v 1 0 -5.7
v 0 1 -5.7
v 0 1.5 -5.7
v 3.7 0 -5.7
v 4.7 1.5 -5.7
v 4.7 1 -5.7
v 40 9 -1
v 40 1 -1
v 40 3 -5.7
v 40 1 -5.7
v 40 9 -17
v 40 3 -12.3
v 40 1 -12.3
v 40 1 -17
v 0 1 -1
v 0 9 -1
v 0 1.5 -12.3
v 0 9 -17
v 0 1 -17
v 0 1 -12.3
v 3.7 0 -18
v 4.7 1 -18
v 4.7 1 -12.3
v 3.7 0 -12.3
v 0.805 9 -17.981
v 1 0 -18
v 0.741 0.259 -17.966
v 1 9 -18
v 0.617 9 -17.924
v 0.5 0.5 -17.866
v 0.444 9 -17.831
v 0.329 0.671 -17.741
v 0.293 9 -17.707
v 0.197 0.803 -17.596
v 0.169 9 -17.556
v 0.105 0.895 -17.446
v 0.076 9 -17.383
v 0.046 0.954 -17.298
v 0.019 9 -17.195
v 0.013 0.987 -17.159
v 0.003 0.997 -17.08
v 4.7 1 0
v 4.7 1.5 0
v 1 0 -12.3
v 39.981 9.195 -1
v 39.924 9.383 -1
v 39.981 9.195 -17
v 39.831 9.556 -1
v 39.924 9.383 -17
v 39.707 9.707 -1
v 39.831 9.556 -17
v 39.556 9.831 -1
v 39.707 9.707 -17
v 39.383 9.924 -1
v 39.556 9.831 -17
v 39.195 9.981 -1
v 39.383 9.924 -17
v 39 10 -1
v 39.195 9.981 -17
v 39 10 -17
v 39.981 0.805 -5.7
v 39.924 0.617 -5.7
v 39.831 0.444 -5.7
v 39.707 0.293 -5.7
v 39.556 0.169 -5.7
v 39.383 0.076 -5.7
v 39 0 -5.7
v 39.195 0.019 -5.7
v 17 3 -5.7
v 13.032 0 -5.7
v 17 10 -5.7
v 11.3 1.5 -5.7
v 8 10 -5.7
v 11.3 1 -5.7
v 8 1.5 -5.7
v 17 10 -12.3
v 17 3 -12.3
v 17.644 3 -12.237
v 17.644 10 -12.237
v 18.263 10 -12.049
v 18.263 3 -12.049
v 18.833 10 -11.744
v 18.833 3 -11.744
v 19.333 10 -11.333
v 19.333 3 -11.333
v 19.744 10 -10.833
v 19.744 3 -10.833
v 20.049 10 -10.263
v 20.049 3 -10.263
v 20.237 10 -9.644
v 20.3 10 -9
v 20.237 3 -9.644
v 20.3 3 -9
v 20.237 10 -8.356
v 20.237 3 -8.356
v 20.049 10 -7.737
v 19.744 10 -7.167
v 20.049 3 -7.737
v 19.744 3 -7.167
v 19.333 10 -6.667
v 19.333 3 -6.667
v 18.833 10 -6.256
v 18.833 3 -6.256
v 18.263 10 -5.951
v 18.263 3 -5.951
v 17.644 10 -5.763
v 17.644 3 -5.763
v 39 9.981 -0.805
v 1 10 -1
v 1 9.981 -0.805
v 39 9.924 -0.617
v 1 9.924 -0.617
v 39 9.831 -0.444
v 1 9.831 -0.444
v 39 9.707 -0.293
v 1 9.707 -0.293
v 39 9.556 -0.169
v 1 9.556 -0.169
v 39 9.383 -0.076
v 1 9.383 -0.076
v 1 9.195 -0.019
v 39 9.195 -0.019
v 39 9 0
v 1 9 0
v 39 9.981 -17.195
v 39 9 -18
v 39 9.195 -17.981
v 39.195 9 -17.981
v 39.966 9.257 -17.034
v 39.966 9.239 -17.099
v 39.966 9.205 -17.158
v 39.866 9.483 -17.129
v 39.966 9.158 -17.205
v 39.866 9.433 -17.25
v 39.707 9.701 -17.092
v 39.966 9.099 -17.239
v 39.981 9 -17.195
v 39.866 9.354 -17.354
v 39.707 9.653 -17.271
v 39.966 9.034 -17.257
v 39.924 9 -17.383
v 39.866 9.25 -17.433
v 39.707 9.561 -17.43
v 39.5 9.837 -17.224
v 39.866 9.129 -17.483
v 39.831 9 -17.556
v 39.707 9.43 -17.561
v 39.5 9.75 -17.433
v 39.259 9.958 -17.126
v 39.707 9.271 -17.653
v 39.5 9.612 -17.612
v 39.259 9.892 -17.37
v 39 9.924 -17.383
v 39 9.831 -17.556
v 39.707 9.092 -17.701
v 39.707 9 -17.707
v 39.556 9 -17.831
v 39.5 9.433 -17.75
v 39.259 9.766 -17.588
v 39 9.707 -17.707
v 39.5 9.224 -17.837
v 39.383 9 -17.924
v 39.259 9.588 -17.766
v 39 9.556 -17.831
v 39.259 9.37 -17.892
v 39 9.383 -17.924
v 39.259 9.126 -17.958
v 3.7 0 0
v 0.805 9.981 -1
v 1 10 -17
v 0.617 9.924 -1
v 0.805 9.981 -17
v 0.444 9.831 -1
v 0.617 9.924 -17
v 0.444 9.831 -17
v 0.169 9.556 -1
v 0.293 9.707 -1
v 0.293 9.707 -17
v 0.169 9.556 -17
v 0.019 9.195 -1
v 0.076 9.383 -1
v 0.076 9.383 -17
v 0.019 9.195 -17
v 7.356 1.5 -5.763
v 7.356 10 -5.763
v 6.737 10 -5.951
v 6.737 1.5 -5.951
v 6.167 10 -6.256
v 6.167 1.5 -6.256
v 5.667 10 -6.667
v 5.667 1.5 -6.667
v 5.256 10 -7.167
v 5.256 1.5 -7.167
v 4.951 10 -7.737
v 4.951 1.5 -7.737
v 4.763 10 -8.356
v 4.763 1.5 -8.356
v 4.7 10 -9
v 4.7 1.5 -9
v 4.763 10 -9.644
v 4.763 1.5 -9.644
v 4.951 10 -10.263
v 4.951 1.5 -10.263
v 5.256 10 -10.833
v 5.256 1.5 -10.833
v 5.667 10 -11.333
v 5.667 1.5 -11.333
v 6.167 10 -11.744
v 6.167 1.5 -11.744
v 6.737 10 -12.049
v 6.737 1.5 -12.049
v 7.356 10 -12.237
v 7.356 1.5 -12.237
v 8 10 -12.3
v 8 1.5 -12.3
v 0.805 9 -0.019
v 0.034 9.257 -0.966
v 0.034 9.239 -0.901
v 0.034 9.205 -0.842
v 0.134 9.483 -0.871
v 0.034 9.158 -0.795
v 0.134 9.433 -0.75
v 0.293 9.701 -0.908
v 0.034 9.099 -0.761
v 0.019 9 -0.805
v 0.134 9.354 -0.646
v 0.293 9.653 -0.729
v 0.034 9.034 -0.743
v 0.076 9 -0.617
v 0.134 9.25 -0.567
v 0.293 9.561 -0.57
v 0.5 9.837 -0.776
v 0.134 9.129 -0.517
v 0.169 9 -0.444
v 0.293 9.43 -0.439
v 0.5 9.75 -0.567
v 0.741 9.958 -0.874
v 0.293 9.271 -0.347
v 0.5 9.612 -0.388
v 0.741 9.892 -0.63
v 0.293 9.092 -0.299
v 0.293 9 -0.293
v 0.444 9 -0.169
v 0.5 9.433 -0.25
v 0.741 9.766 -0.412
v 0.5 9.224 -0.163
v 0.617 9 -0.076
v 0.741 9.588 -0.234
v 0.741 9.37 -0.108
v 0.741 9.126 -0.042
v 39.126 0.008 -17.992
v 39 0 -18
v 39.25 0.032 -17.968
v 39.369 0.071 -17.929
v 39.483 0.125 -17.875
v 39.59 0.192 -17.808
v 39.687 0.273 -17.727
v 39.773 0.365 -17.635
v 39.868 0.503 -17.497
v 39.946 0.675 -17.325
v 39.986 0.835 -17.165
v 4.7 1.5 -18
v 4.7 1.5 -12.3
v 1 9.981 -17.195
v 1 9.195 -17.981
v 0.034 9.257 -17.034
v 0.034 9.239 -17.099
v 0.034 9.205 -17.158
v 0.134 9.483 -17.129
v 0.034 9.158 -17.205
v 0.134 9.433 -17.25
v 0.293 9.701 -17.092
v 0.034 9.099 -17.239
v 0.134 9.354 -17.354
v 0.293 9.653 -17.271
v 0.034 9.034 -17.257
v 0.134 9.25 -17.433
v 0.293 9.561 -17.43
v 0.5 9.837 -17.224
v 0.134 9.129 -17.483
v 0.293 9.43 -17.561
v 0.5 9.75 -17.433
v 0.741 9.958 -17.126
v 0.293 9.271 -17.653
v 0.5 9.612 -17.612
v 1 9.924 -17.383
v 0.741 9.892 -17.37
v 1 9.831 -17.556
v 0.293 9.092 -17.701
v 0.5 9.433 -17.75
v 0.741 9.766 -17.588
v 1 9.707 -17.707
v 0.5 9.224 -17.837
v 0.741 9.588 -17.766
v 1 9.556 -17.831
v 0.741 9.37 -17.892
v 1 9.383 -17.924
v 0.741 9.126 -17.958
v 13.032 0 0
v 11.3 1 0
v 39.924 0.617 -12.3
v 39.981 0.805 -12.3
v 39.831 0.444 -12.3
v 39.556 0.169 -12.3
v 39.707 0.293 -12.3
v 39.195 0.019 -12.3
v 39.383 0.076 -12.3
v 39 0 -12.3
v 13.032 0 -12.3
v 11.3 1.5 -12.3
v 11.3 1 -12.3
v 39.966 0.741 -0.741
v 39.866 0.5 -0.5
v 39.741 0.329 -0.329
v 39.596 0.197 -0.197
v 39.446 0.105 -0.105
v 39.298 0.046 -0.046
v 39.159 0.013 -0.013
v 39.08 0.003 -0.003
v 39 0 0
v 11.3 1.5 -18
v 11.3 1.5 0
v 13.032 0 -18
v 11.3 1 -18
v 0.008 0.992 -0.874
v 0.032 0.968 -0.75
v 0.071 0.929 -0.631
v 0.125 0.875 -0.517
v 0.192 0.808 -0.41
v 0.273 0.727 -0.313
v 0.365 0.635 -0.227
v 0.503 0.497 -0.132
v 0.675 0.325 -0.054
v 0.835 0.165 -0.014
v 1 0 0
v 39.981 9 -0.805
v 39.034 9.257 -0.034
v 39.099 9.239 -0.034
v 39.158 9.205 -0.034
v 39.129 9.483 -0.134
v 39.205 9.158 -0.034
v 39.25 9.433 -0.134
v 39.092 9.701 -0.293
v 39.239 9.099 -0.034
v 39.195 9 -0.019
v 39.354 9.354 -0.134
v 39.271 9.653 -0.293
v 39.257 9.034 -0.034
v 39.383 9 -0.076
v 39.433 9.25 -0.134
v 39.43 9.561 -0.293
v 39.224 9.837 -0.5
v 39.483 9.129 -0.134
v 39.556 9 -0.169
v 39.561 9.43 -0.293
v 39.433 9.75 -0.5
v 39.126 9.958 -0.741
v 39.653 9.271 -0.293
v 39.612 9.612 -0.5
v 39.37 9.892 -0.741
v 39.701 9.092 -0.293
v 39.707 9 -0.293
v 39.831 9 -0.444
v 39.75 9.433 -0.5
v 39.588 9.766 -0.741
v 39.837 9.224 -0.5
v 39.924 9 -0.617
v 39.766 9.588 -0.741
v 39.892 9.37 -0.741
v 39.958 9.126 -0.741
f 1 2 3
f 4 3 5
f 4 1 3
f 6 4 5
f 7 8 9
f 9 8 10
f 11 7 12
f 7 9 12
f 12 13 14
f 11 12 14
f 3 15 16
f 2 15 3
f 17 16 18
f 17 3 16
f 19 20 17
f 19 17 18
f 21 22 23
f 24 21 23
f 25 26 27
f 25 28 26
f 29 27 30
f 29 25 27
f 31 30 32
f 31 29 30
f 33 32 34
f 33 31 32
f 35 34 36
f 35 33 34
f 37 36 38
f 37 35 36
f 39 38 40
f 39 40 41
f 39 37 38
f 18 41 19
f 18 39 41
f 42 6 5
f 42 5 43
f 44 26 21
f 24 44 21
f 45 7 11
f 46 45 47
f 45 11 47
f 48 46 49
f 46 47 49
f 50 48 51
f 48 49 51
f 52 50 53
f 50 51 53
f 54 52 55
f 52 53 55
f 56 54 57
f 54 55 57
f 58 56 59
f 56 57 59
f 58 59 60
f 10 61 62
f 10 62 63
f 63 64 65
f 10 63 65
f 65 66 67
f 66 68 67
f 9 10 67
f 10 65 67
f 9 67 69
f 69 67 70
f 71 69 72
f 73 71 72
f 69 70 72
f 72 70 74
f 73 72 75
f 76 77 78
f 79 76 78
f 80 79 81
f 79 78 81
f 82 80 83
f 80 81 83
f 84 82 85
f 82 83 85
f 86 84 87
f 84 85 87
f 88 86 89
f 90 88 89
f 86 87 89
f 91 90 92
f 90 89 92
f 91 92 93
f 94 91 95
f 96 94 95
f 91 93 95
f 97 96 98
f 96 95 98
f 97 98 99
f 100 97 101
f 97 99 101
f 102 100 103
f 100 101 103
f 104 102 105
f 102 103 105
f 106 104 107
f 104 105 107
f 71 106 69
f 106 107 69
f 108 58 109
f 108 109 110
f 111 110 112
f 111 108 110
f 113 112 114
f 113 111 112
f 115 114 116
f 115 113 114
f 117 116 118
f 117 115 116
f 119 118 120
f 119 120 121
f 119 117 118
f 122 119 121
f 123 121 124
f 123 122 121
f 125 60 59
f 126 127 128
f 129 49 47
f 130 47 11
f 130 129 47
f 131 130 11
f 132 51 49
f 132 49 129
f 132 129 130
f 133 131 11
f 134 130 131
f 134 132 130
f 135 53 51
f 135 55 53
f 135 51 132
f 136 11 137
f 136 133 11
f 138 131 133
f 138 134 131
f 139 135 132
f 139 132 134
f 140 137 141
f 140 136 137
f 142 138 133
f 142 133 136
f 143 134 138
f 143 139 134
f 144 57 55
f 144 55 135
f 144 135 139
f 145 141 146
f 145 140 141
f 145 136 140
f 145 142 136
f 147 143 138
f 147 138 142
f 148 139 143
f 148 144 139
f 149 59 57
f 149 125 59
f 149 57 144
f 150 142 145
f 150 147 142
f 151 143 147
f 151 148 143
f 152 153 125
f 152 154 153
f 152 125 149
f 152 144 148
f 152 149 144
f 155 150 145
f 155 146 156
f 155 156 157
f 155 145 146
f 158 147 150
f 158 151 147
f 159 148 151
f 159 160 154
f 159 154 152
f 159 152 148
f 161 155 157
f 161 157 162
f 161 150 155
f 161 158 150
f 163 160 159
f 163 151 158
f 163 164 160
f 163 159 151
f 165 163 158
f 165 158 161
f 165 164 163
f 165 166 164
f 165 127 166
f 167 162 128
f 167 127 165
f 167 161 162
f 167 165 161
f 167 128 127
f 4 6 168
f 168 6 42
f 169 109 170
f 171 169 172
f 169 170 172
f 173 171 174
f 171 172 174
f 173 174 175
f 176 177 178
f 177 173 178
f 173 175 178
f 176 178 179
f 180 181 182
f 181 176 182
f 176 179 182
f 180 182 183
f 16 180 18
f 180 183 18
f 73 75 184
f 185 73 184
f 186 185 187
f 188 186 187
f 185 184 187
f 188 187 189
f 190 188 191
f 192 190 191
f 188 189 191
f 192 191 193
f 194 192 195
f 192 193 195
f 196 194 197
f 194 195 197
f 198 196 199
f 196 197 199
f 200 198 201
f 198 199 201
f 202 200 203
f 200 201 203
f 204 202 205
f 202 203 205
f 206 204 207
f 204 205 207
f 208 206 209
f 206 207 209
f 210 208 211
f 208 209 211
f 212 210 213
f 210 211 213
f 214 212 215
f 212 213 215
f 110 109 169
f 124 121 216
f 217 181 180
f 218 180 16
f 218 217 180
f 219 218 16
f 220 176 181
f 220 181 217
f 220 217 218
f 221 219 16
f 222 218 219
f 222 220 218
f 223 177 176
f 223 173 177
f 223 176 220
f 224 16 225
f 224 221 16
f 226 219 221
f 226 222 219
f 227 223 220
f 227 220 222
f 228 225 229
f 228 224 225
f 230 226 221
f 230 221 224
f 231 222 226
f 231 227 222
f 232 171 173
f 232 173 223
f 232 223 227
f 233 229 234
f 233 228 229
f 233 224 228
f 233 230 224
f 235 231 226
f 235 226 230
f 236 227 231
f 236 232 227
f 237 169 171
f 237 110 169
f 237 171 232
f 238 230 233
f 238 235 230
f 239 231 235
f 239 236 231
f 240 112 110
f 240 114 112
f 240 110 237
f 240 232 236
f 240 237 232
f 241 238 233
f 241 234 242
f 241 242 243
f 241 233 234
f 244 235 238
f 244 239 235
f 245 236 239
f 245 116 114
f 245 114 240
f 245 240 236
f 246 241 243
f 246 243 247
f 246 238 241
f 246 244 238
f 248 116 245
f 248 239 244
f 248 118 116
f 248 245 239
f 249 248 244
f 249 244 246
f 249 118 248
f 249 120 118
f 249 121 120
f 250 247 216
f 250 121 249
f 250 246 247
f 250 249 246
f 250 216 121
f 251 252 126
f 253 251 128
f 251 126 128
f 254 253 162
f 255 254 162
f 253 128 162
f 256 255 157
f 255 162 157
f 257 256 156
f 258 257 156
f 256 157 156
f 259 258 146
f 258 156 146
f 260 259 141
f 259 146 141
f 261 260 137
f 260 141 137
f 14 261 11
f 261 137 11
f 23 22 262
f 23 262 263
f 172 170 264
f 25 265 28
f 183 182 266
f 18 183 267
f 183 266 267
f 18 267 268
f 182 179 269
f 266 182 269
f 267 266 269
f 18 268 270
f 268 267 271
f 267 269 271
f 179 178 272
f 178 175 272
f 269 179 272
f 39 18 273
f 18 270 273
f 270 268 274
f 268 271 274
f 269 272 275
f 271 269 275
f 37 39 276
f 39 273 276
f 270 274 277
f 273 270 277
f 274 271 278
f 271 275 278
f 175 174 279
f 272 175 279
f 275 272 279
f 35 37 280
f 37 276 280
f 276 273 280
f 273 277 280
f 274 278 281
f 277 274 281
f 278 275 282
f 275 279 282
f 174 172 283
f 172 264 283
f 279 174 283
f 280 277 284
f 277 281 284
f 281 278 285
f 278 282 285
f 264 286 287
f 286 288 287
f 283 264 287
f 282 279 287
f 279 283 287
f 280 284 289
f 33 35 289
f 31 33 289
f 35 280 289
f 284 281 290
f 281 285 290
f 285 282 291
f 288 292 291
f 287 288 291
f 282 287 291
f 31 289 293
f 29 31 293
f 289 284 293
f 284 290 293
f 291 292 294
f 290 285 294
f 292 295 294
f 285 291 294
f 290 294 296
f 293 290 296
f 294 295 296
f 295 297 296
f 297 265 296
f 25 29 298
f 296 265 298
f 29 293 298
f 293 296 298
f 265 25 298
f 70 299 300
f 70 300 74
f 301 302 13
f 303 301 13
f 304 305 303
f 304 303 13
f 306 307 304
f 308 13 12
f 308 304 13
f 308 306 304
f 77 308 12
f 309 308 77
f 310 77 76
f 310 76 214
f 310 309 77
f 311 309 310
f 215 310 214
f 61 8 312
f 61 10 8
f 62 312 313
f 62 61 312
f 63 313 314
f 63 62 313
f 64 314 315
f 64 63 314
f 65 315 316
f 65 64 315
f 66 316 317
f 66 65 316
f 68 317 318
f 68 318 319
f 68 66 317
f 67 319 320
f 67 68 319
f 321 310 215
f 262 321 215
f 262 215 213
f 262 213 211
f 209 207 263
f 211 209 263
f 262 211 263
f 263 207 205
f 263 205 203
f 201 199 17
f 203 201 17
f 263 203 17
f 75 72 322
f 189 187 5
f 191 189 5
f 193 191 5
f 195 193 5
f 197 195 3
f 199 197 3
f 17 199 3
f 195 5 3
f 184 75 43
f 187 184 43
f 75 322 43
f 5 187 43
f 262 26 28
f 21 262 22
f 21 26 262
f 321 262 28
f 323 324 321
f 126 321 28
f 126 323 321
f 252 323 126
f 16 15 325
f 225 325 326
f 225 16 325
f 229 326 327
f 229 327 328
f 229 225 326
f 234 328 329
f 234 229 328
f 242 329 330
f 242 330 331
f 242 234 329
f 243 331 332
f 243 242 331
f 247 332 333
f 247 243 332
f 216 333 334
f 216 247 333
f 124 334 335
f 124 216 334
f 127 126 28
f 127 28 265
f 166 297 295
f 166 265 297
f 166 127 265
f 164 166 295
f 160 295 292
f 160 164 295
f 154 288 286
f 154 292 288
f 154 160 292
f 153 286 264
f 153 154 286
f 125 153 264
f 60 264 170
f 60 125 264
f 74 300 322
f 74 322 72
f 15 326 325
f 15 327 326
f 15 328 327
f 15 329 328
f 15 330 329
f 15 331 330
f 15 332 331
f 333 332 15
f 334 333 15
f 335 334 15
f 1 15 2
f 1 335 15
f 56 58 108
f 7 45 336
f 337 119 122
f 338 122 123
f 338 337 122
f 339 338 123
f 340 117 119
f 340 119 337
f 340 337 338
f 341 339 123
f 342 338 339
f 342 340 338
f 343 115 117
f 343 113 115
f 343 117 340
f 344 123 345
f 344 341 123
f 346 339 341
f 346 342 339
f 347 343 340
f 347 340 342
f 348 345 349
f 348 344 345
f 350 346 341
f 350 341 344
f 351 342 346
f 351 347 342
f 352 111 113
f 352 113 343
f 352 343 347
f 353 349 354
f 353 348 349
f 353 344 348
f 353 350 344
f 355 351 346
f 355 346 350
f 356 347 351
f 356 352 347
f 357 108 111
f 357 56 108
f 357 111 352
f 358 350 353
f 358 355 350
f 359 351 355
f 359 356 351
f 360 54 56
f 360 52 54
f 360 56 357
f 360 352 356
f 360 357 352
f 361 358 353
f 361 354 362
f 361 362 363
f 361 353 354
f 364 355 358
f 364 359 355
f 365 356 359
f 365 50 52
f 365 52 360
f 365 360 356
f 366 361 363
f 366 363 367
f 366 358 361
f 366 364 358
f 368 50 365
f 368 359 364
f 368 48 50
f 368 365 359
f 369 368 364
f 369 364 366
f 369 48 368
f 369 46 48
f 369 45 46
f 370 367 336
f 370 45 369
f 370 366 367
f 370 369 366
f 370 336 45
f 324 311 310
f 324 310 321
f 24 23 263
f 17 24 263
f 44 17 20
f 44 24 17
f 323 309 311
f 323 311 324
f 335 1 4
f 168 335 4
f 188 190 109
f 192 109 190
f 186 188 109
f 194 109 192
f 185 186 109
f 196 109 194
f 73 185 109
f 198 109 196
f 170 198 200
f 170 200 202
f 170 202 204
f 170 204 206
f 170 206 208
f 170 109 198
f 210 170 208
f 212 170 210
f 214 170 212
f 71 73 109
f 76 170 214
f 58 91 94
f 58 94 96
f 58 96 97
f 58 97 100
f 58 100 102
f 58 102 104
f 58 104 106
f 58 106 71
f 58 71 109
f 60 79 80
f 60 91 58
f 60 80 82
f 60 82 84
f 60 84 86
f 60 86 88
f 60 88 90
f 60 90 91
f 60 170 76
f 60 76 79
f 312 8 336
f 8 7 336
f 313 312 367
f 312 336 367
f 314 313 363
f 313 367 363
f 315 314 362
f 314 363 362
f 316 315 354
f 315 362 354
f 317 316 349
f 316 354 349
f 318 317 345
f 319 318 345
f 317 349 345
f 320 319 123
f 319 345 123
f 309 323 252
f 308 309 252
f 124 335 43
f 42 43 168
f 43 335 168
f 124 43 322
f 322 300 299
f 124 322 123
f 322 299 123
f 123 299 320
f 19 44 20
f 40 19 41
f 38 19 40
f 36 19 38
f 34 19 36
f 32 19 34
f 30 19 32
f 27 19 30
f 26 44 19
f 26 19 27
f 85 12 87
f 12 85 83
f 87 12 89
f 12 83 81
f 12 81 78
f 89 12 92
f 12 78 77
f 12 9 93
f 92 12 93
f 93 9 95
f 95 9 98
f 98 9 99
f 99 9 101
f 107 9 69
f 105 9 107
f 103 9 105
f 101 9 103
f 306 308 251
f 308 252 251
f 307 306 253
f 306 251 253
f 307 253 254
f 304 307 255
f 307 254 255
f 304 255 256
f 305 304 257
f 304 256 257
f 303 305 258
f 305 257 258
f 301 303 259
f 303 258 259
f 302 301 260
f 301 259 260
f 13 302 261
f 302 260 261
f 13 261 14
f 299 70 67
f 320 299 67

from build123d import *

# Parameters (mm, degrees)
SKETCH_1_W             = 40
SKETCH_1_H             = 18
EXTRUDE_1_DEPTH        = 10
CUT_EXTRUDE_1_DEPTH    = 3
CUT_EXTRUDE_2_DEPTH    = 1.5
CHAMFER_1_SIZE         = 1
CHAMFER_2_SIZE         = 1
CHAMFER_2_SIZE2        = 1.732050808
CHAMFER_2_PART_2_SIZE  = 1
CHAMFER_2_PART_2_SIZE2 = 1.732050808
FILLET_1_R             = 1


with BuildPart() as part:
    # 草图1 → 凸台-拉伸1 (new body)
    with BuildSketch(Plane(origin=(0, 0, 0), x_dir=(1, 0, 0), z_dir=(0, 1, 0))):
        with Locations((20, 9)):
            Rectangle(SKETCH_1_W, SKETCH_1_H)
        with BuildLine():
            Line((17, 5.7), (8, 5.7))
            ThreePointArc((8, 5.7), (4.7, 9), (8, 12.3))
            Line((8, 12.3), (17, 12.3))
            ThreePointArc((17, 12.3), (20.3, 9), (17, 5.7))
        make_face(mode=Mode.SUBTRACT)
    extrude(amount=EXTRUDE_1_DEPTH)

    # 草图2 → 切除-拉伸1 (cut)
    with BuildSketch(Plane.XZ):
        with BuildLine():
            Line((40, -5.7), (40, -12.3))
            Line((40, -12.3), (8, -12.3))
            ThreePointArc((8, -12.3), (4.7, -9), (8, -5.7))
            Line((8, -5.7), (40, -5.7))
        make_face()
    extrude(amount=-CUT_EXTRUDE_1_DEPTH, mode=Mode.SUBTRACT)

    # 草图3 → 切除-拉伸2 (cut)
    with BuildSketch(Plane.XZ):
        Polygon((0, -5.7), (4.7, -5.7), (4.7, 0), (11.3, 0), (11.3, -18), (4.7, -18), (4.7, -12.3), (0, -12.3), align=None)
    extrude(amount=-CUT_EXTRUDE_2_DEPTH, mode=Mode.SUBTRACT)

    # 倒角1
    chamfer_1_edges = [part.edges().sort_by_distance(p)[0] for p in [
        (0, 0, -15.15),
        (0, 0, -2.85),
        (4.7, 0, -2.85),
        (4.7, 0, -15.15),
    ]]
    chamfer(chamfer_1_edges, length=CHAMFER_1_SIZE)

    # 倒角2
    chamfer_2_edges = [part.edges().sort_by_distance(p)[0] for p in [
        (11.3, 0, -2.85),
    ]]
    chamfer_2_side = [part.faces().sort_by_distance(p)[0] for p in [
        (11.3, 0.75, -2.85),
    ]]
    chamfer(chamfer_2_edges, length=CHAMFER_2_SIZE, length2=CHAMFER_2_SIZE2, reference=chamfer_2_side[0])

    # 倒角2 part 2
    chamfer_2_part_2_edges = [part.edges().sort_by_distance(p)[0] for p in [
        (11.3, 0, -15.15),
    ]]
    chamfer_2_part_2_side = [part.faces().sort_by_distance(p)[0] for p in [
        (11.3, 0.75, -15.15),
    ]]
    chamfer(chamfer_2_part_2_edges, length=CHAMFER_2_PART_2_SIZE, length2=CHAMFER_2_PART_2_SIZE2, reference=chamfer_2_part_2_side[0])

    # 圆角1
    fillet_1_edges = [part.edges().sort_by_distance(p)[0] for p in [
        (20, 10, -18),
        (40, 10, -9),
        (20, 10, 0),
        (0, 10, -9),
        (40, 5, 0),
        (40, 5, -18),
        (0, 5.5, -18),
        (0, 5.5, 0),
        (40, 0, -15.15),
        (40, 0, -2.85),
    ]]
    fillet(fillet_1_edges, radius=FILLET_1_R)


solid = part.part
